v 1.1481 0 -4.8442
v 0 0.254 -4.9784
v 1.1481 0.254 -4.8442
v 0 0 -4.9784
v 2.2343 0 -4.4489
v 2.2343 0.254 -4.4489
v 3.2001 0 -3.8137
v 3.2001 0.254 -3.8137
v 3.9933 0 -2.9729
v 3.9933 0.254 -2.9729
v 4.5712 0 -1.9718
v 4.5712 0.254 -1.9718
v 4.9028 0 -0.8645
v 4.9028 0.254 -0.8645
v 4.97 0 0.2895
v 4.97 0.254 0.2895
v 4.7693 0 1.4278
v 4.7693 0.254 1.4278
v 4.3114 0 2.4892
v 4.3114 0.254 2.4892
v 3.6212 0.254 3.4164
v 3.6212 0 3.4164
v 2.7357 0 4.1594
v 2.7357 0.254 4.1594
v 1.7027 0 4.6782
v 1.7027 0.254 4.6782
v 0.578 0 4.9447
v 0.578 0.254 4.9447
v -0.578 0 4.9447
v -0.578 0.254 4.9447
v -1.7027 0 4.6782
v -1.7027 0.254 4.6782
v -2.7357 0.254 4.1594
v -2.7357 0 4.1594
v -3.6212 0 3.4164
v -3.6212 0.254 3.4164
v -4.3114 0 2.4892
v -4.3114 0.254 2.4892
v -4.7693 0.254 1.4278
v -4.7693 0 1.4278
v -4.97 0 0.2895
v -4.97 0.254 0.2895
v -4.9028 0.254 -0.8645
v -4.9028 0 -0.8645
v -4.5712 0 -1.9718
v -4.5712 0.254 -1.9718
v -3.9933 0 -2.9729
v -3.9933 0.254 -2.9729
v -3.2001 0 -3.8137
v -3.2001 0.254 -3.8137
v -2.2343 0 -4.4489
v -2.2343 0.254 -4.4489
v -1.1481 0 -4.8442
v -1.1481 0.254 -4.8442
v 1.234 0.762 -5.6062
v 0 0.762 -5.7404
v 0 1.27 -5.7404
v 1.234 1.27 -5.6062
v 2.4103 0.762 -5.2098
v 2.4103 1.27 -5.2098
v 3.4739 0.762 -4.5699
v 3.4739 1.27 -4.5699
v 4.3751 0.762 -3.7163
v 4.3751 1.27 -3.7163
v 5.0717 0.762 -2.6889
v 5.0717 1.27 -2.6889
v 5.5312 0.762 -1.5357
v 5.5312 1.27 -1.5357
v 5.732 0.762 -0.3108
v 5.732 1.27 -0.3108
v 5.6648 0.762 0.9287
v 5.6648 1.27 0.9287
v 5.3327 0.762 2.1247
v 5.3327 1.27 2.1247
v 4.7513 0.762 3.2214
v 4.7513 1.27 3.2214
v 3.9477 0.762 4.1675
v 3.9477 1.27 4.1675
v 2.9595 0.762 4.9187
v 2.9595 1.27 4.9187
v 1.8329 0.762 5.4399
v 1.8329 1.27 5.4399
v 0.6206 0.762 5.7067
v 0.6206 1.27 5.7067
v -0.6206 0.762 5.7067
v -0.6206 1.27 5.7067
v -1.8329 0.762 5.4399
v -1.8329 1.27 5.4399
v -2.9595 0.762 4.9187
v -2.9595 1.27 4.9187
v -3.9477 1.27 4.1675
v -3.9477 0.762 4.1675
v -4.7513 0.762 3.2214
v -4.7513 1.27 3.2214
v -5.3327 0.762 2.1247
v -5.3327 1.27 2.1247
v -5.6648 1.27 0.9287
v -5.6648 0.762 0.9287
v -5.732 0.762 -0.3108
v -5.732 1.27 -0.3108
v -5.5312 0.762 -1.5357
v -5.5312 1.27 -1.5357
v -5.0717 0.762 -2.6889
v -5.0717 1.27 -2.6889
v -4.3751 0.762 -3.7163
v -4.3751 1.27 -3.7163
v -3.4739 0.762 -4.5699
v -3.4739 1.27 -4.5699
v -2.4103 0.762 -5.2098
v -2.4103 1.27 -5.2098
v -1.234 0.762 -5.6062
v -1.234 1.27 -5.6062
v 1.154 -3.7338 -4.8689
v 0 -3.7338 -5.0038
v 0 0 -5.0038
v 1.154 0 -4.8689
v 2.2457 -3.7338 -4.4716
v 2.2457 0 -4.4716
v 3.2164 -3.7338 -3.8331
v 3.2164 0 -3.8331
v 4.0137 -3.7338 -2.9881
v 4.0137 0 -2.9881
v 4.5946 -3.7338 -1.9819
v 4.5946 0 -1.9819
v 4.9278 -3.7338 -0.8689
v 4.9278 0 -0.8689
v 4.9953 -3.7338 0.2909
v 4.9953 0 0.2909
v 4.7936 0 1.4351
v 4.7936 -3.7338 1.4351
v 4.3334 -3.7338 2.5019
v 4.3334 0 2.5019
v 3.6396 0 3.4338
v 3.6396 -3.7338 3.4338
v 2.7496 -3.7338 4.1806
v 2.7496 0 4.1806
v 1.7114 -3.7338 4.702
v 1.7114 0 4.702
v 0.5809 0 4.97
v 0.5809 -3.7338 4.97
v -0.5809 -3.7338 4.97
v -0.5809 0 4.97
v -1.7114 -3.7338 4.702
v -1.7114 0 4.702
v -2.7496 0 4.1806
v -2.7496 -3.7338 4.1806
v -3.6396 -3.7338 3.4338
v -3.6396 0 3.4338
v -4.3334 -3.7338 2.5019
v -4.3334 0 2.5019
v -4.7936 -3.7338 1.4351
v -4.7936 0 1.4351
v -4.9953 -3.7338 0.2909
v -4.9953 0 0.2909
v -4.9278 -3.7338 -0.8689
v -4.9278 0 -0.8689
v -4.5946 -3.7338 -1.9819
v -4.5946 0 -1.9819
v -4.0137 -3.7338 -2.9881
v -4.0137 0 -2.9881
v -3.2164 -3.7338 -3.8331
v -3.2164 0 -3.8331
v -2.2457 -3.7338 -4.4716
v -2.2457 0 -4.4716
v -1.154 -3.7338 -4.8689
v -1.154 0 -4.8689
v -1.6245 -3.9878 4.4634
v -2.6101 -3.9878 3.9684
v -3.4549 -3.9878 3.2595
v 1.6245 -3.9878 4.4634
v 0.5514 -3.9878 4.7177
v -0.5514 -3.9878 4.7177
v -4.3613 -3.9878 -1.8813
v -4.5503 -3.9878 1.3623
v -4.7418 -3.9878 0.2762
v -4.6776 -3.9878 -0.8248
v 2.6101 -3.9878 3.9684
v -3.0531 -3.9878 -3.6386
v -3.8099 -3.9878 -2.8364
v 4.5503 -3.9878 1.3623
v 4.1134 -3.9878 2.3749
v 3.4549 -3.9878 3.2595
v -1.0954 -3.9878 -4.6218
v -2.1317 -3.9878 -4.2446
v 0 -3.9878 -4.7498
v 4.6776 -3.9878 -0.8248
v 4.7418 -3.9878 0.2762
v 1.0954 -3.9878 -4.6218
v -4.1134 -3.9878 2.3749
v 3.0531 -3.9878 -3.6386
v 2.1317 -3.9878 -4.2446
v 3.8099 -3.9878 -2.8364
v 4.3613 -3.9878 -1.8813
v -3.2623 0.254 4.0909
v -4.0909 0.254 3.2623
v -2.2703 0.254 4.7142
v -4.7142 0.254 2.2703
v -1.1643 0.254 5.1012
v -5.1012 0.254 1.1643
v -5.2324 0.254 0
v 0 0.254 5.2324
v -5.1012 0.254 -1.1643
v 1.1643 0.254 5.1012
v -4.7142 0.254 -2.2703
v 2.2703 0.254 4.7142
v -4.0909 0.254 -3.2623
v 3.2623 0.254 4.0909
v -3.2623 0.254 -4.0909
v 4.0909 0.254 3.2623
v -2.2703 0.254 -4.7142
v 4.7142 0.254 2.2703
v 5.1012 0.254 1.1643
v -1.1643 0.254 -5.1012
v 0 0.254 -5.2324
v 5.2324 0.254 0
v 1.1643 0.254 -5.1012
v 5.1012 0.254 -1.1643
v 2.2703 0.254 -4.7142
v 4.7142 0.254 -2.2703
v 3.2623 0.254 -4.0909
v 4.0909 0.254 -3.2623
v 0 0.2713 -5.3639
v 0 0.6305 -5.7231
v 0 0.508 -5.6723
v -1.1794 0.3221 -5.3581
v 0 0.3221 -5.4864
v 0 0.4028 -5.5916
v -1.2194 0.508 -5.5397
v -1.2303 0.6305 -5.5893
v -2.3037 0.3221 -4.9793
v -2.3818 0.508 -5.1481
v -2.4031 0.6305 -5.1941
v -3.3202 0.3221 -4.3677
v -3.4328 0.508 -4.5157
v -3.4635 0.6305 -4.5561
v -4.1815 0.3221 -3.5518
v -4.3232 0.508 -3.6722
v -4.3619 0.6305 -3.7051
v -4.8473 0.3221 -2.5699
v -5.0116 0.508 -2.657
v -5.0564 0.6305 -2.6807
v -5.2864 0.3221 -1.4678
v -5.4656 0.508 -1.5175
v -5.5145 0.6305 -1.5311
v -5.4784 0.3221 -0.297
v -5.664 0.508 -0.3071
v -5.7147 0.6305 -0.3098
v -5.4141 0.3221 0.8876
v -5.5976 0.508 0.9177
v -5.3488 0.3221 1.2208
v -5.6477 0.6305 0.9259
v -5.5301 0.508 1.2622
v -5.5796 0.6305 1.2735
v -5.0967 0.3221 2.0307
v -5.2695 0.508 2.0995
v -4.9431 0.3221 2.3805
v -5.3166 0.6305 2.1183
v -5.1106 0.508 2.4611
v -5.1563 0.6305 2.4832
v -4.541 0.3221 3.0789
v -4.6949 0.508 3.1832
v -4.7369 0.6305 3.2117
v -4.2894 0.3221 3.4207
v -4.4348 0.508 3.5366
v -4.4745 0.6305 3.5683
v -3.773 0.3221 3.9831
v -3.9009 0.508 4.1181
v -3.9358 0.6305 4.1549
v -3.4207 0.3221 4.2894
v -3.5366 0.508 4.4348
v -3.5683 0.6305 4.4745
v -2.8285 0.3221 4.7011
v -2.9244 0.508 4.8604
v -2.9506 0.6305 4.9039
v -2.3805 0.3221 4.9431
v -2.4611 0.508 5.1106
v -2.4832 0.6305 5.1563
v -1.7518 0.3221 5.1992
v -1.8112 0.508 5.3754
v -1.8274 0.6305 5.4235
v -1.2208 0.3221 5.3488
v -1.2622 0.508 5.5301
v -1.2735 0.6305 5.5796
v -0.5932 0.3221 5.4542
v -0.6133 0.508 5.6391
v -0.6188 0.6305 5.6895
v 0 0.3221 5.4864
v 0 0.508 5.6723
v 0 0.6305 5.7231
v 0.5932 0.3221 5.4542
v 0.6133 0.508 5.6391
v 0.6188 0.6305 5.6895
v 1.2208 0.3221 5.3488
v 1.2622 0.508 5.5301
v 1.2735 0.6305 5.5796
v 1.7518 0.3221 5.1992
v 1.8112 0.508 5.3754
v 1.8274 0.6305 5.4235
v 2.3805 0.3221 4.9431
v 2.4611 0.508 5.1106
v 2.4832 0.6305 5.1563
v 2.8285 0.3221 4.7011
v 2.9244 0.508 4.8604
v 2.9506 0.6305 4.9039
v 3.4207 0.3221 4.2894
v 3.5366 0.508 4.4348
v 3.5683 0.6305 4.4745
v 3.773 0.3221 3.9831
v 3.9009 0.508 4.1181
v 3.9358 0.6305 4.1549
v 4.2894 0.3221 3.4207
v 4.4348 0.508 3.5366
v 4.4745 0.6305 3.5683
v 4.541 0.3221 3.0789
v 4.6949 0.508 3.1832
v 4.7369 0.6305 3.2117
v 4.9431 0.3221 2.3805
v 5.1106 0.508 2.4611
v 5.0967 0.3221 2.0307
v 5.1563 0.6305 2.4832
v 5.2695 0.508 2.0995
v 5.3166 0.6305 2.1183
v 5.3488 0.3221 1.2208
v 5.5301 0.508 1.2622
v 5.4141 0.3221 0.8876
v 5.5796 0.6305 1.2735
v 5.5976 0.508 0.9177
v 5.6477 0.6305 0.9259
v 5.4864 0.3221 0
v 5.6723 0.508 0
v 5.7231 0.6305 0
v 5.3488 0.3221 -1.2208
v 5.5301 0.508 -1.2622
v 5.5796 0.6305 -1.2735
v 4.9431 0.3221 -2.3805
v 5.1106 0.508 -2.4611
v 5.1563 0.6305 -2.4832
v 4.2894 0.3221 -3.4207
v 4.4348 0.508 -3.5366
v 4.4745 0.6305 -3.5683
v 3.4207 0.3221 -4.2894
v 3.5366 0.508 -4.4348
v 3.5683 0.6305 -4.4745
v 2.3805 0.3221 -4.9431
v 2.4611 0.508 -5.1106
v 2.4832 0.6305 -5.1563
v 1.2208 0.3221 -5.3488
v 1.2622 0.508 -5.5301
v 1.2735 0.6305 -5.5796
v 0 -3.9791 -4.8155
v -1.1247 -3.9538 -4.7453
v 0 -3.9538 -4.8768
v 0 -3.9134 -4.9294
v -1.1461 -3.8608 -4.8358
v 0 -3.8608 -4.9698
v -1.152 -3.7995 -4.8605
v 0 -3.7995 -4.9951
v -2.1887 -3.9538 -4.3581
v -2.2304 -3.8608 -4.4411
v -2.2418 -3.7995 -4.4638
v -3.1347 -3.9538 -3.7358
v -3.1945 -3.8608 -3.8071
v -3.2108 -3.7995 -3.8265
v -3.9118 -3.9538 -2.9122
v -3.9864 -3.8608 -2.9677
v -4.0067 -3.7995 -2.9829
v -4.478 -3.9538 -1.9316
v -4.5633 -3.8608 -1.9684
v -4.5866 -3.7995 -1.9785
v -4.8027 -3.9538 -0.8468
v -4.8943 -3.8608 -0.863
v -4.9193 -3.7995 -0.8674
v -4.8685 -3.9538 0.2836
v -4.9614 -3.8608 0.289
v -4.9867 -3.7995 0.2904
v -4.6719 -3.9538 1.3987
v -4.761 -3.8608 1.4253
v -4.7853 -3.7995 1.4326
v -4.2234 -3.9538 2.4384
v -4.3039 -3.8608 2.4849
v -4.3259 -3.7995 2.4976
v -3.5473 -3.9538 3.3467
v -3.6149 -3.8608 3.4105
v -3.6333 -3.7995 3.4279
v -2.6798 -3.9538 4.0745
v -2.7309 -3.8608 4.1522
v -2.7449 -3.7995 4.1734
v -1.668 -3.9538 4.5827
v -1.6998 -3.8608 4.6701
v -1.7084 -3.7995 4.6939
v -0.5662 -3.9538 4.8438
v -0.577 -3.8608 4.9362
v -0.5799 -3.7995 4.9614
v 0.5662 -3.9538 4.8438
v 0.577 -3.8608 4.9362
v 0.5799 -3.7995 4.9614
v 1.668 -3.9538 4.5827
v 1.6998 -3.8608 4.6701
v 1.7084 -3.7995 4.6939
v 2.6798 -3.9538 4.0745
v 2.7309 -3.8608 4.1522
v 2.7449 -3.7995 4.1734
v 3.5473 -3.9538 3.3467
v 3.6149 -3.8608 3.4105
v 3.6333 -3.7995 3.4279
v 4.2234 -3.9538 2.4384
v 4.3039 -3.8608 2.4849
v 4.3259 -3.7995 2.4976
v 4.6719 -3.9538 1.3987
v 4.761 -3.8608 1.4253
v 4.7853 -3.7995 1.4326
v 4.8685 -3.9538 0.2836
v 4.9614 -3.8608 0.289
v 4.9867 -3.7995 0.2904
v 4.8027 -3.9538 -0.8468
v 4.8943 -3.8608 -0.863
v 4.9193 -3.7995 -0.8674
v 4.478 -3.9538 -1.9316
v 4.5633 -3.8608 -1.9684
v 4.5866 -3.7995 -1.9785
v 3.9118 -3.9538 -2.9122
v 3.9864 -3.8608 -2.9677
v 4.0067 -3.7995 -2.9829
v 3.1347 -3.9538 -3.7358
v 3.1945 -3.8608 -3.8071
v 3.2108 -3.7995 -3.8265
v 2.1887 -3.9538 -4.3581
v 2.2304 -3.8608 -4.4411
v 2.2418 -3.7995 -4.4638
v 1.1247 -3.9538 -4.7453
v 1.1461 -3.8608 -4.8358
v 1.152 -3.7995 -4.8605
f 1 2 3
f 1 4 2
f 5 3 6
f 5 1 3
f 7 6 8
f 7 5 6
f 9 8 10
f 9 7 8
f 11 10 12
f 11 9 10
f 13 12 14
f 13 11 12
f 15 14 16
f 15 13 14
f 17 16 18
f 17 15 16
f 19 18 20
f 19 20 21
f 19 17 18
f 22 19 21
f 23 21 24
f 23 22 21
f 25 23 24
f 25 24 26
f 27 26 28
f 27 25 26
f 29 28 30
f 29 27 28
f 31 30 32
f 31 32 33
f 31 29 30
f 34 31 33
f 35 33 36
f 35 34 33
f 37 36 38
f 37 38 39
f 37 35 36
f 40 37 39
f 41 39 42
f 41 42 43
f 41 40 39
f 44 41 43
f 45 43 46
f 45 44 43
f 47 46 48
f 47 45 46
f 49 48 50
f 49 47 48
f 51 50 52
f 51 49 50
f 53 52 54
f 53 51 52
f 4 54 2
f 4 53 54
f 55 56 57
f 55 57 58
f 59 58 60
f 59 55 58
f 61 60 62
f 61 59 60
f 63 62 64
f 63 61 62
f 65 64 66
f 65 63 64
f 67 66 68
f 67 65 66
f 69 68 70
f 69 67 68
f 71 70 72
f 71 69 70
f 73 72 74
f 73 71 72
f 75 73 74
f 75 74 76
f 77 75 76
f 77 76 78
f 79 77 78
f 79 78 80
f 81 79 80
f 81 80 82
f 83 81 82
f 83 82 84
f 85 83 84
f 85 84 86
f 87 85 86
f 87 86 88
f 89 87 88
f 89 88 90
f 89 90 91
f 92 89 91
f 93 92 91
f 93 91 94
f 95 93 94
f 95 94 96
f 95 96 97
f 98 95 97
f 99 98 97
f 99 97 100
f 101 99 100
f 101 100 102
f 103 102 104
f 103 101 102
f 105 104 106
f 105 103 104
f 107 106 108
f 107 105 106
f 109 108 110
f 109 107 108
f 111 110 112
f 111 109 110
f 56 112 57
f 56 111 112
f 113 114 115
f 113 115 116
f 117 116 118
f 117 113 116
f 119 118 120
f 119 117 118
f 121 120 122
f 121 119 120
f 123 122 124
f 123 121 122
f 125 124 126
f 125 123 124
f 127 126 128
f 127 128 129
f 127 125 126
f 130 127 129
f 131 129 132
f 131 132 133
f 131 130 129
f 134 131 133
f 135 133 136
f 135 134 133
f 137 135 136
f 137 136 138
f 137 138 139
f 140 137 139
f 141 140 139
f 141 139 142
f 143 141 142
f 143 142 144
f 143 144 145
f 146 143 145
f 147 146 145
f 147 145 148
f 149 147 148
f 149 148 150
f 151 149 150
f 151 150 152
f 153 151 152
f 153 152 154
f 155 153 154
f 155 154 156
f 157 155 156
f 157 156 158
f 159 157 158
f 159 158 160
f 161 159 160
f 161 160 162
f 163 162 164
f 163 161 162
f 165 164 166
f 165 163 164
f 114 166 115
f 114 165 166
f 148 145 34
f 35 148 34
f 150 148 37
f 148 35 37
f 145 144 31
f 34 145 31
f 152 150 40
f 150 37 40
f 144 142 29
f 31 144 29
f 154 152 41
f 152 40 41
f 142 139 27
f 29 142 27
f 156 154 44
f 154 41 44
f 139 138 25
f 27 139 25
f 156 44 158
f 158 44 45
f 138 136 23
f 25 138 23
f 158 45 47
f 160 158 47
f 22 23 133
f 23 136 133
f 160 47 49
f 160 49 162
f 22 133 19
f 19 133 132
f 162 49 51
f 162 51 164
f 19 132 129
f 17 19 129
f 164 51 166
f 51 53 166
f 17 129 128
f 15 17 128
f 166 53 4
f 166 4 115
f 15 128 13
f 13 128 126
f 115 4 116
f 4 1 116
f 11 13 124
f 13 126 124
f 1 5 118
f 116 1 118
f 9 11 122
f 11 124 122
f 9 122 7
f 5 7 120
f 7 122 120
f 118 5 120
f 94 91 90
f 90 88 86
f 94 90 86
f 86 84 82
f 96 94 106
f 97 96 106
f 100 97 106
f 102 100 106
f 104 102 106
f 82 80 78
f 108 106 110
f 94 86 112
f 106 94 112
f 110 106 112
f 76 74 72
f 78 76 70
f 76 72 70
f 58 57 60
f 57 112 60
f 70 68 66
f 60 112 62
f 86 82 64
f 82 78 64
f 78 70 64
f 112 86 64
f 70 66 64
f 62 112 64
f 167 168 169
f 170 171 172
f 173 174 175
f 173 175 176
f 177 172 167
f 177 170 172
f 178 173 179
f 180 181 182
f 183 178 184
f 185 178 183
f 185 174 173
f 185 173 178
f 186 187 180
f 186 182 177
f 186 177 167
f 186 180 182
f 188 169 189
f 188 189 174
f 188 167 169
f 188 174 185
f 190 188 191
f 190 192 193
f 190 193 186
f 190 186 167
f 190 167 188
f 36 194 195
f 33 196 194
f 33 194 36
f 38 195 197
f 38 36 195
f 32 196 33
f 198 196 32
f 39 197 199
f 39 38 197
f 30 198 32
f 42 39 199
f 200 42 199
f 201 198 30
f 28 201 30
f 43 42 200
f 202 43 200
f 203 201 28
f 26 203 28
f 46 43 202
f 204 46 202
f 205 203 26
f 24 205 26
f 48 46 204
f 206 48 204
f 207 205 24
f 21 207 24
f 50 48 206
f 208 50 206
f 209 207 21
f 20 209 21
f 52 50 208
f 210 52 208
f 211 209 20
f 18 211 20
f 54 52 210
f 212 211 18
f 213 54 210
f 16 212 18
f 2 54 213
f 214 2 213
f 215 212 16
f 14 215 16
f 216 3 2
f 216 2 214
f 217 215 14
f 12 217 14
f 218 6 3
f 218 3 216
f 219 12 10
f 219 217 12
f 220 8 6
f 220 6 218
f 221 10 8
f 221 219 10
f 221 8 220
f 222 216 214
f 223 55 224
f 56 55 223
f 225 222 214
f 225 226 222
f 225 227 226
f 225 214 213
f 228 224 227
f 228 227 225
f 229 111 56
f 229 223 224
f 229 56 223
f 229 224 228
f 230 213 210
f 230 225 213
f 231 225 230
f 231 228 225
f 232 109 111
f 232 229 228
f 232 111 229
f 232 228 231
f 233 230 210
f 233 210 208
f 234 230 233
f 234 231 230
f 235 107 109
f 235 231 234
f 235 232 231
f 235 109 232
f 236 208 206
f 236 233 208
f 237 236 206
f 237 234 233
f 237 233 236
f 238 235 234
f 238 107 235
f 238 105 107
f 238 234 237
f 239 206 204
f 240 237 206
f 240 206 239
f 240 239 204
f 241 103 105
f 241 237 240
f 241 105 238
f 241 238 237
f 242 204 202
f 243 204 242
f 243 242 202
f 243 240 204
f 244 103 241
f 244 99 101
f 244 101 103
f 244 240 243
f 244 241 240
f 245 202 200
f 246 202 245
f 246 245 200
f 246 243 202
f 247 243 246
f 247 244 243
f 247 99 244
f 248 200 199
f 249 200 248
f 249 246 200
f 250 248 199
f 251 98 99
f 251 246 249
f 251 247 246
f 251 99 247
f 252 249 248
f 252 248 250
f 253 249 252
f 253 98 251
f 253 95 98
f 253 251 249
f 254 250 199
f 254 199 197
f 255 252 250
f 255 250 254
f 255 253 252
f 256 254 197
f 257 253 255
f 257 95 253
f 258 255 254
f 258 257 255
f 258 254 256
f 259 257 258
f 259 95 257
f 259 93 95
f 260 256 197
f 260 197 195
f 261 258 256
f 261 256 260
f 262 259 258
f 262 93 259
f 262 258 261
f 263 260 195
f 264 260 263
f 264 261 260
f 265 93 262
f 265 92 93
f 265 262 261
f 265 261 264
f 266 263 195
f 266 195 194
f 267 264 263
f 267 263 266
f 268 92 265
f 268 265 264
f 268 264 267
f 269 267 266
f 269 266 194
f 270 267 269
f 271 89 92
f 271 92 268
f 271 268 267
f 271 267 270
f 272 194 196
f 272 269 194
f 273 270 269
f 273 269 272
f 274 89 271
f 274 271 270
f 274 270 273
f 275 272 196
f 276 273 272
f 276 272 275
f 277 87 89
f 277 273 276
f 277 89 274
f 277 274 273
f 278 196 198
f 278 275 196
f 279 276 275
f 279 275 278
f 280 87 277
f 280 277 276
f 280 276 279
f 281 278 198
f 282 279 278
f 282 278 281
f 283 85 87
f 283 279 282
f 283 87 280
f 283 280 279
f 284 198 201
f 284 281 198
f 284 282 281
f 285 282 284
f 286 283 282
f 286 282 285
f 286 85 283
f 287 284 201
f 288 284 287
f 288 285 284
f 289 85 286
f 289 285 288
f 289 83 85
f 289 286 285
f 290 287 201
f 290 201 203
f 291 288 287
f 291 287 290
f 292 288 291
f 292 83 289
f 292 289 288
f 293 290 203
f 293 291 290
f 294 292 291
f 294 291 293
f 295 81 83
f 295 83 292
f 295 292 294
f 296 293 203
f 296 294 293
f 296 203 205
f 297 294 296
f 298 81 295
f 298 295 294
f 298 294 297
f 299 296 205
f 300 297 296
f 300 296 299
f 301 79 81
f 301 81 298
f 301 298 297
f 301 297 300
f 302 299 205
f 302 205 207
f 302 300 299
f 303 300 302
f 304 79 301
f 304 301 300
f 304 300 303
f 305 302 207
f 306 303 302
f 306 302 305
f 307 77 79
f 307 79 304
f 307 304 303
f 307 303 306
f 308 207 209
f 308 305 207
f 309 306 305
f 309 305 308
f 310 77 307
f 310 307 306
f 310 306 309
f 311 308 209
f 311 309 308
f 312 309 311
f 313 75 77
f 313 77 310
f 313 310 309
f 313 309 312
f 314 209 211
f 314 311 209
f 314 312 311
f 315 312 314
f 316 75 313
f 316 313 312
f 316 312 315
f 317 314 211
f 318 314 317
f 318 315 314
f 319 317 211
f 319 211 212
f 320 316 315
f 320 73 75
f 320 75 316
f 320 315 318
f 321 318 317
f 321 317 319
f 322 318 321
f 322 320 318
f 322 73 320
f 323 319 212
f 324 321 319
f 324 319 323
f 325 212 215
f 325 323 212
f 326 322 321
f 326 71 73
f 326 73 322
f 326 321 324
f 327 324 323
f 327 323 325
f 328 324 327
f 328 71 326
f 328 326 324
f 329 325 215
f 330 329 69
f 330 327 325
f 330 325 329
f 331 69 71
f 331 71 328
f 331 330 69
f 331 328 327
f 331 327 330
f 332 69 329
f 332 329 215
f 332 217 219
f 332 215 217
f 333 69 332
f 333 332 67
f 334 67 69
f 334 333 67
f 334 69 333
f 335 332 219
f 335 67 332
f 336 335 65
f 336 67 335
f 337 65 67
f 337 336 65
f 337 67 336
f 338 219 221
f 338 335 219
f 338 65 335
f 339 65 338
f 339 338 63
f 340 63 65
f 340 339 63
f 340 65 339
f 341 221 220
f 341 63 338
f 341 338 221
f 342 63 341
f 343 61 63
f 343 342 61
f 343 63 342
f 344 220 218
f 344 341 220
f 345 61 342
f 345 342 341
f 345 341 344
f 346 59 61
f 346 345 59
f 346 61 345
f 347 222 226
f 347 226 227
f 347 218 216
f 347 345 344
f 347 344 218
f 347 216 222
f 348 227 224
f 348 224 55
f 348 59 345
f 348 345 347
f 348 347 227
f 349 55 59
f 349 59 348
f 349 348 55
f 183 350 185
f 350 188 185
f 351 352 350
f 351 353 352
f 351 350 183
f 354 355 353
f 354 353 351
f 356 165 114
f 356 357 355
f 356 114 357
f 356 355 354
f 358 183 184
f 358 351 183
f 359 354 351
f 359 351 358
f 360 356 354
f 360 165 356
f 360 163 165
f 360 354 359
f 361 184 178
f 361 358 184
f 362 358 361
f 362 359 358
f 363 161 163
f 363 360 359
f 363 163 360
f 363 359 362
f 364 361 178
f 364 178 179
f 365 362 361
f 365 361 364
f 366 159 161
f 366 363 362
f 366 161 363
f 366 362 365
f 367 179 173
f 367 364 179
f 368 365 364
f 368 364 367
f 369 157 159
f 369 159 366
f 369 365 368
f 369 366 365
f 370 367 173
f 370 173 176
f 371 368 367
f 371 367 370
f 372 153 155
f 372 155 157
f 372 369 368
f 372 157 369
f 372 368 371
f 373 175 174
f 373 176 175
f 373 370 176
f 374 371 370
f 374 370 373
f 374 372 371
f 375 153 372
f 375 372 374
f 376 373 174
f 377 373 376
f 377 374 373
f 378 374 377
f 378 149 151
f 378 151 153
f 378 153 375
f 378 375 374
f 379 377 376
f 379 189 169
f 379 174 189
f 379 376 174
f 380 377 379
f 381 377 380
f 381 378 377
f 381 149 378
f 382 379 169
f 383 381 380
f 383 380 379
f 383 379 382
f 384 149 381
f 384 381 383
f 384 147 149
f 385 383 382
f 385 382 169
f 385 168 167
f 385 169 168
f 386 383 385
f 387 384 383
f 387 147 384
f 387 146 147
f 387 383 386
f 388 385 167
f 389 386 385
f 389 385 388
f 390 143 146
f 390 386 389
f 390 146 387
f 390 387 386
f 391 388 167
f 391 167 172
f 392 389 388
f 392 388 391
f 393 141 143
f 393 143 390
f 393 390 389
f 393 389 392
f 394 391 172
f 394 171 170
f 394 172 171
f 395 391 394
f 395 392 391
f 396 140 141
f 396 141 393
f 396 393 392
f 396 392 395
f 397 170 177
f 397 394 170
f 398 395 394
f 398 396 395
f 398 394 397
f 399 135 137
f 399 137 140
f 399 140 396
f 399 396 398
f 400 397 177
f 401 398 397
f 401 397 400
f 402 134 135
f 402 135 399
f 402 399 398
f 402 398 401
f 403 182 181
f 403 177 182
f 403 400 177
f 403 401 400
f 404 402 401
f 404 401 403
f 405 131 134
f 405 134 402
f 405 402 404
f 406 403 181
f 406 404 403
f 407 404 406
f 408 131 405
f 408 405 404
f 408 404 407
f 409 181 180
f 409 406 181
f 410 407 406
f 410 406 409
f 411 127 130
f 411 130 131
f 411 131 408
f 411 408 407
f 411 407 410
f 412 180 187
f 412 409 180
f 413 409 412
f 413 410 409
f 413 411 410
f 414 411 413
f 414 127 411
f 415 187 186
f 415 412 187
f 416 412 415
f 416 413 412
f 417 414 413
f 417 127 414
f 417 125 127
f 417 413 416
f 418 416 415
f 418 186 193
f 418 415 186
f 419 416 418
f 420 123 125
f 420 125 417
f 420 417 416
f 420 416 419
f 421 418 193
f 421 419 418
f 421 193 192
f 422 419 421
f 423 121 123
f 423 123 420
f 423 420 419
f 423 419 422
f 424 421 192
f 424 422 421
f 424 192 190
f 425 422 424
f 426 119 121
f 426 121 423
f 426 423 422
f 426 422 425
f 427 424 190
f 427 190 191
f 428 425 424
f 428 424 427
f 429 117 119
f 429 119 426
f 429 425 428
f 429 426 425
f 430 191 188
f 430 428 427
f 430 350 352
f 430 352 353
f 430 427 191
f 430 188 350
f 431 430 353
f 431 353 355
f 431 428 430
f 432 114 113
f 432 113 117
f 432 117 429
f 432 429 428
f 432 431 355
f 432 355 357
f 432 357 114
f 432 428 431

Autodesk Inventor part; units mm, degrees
sketch "Sketch_2" plane through (0, 0, 0) normal (1, 0, 0) x (0, 1, 0)
  line L0 (-3.9878, 0) -> (0, 0)
  line L1 (0, 0) -> (0, -5.0038)
  line L2 (0, -5.0038) -> (-3.7338, -5.0038)
  arc A0 (-3.9878, -4.7498) -> (-3.7338, -5.0038) centre (-3.7338, -4.7498) ccw
  line L3 (-3.9878, -4.7498) -> (-3.9878, 0)
  line L4 (-3.9878, 0) -> (0, 0)
revolve "Revolution1" add sketch "Sketch_2" angle 360 about axis through (0, -3.9878, 0) along (0, -1, 0)
sketch "Sketch_4" plane through (0, 0, 0) normal (1, 0, 0) x (0, 1, 0)
  line L0 (-0.254, 0) -> (1.27, 0)
  line L1 (1.27, 0) -> (1.27, -5.7404)
  line L2 (1.27, -5.7404) -> (0.762, -5.7404)
  arc A0 (0.254, -5.2324) -> (0.762, -5.7404) centre (0.762, -5.2324) ccw
  line L3 (0.254, -5.2324) -> (0.254, -4.9784)
  line L4 (0.254, -4.9784) -> (-0.254, -4.9784)
  line L5 (-0.254, -4.9784) -> (-0.254, 0)
  line L6 (-0.254, 0) -> (1.27, 0)
revolve "Revolution2" add sketch "Sketch_4" angle 360 about axis through (0, -0.254, 0) along (0, -1, 0)
ref_plane "to_body_XY" through (0, 0, 0) normal (0, -1, 0) x (1, 0, 0)
ref_plane "to_body_YZ" through (0, 0, 0) normal (1, 0, 0) x (0, 0, 1)
ref_plane "to_body_ZX" through (0, 0, 0) normal (0, 0, 1) x (0, -1, 0)
ref_plane "to_trmnls_XY" through (0, -3.7338, 0) normal (0, 1, 0) x (1, 0, 0)
ref_plane "to_trmnls_YZ" through (0, -3.7338, 0) normal (1, 0, 0) x (0, 0, -1)
ref_plane "to_trmnls_ZX" through (0, -3.7338, 0) normal (0, 0, -1) x (0, 1, 0)
properties part number "SB40-trmnl_hold"
